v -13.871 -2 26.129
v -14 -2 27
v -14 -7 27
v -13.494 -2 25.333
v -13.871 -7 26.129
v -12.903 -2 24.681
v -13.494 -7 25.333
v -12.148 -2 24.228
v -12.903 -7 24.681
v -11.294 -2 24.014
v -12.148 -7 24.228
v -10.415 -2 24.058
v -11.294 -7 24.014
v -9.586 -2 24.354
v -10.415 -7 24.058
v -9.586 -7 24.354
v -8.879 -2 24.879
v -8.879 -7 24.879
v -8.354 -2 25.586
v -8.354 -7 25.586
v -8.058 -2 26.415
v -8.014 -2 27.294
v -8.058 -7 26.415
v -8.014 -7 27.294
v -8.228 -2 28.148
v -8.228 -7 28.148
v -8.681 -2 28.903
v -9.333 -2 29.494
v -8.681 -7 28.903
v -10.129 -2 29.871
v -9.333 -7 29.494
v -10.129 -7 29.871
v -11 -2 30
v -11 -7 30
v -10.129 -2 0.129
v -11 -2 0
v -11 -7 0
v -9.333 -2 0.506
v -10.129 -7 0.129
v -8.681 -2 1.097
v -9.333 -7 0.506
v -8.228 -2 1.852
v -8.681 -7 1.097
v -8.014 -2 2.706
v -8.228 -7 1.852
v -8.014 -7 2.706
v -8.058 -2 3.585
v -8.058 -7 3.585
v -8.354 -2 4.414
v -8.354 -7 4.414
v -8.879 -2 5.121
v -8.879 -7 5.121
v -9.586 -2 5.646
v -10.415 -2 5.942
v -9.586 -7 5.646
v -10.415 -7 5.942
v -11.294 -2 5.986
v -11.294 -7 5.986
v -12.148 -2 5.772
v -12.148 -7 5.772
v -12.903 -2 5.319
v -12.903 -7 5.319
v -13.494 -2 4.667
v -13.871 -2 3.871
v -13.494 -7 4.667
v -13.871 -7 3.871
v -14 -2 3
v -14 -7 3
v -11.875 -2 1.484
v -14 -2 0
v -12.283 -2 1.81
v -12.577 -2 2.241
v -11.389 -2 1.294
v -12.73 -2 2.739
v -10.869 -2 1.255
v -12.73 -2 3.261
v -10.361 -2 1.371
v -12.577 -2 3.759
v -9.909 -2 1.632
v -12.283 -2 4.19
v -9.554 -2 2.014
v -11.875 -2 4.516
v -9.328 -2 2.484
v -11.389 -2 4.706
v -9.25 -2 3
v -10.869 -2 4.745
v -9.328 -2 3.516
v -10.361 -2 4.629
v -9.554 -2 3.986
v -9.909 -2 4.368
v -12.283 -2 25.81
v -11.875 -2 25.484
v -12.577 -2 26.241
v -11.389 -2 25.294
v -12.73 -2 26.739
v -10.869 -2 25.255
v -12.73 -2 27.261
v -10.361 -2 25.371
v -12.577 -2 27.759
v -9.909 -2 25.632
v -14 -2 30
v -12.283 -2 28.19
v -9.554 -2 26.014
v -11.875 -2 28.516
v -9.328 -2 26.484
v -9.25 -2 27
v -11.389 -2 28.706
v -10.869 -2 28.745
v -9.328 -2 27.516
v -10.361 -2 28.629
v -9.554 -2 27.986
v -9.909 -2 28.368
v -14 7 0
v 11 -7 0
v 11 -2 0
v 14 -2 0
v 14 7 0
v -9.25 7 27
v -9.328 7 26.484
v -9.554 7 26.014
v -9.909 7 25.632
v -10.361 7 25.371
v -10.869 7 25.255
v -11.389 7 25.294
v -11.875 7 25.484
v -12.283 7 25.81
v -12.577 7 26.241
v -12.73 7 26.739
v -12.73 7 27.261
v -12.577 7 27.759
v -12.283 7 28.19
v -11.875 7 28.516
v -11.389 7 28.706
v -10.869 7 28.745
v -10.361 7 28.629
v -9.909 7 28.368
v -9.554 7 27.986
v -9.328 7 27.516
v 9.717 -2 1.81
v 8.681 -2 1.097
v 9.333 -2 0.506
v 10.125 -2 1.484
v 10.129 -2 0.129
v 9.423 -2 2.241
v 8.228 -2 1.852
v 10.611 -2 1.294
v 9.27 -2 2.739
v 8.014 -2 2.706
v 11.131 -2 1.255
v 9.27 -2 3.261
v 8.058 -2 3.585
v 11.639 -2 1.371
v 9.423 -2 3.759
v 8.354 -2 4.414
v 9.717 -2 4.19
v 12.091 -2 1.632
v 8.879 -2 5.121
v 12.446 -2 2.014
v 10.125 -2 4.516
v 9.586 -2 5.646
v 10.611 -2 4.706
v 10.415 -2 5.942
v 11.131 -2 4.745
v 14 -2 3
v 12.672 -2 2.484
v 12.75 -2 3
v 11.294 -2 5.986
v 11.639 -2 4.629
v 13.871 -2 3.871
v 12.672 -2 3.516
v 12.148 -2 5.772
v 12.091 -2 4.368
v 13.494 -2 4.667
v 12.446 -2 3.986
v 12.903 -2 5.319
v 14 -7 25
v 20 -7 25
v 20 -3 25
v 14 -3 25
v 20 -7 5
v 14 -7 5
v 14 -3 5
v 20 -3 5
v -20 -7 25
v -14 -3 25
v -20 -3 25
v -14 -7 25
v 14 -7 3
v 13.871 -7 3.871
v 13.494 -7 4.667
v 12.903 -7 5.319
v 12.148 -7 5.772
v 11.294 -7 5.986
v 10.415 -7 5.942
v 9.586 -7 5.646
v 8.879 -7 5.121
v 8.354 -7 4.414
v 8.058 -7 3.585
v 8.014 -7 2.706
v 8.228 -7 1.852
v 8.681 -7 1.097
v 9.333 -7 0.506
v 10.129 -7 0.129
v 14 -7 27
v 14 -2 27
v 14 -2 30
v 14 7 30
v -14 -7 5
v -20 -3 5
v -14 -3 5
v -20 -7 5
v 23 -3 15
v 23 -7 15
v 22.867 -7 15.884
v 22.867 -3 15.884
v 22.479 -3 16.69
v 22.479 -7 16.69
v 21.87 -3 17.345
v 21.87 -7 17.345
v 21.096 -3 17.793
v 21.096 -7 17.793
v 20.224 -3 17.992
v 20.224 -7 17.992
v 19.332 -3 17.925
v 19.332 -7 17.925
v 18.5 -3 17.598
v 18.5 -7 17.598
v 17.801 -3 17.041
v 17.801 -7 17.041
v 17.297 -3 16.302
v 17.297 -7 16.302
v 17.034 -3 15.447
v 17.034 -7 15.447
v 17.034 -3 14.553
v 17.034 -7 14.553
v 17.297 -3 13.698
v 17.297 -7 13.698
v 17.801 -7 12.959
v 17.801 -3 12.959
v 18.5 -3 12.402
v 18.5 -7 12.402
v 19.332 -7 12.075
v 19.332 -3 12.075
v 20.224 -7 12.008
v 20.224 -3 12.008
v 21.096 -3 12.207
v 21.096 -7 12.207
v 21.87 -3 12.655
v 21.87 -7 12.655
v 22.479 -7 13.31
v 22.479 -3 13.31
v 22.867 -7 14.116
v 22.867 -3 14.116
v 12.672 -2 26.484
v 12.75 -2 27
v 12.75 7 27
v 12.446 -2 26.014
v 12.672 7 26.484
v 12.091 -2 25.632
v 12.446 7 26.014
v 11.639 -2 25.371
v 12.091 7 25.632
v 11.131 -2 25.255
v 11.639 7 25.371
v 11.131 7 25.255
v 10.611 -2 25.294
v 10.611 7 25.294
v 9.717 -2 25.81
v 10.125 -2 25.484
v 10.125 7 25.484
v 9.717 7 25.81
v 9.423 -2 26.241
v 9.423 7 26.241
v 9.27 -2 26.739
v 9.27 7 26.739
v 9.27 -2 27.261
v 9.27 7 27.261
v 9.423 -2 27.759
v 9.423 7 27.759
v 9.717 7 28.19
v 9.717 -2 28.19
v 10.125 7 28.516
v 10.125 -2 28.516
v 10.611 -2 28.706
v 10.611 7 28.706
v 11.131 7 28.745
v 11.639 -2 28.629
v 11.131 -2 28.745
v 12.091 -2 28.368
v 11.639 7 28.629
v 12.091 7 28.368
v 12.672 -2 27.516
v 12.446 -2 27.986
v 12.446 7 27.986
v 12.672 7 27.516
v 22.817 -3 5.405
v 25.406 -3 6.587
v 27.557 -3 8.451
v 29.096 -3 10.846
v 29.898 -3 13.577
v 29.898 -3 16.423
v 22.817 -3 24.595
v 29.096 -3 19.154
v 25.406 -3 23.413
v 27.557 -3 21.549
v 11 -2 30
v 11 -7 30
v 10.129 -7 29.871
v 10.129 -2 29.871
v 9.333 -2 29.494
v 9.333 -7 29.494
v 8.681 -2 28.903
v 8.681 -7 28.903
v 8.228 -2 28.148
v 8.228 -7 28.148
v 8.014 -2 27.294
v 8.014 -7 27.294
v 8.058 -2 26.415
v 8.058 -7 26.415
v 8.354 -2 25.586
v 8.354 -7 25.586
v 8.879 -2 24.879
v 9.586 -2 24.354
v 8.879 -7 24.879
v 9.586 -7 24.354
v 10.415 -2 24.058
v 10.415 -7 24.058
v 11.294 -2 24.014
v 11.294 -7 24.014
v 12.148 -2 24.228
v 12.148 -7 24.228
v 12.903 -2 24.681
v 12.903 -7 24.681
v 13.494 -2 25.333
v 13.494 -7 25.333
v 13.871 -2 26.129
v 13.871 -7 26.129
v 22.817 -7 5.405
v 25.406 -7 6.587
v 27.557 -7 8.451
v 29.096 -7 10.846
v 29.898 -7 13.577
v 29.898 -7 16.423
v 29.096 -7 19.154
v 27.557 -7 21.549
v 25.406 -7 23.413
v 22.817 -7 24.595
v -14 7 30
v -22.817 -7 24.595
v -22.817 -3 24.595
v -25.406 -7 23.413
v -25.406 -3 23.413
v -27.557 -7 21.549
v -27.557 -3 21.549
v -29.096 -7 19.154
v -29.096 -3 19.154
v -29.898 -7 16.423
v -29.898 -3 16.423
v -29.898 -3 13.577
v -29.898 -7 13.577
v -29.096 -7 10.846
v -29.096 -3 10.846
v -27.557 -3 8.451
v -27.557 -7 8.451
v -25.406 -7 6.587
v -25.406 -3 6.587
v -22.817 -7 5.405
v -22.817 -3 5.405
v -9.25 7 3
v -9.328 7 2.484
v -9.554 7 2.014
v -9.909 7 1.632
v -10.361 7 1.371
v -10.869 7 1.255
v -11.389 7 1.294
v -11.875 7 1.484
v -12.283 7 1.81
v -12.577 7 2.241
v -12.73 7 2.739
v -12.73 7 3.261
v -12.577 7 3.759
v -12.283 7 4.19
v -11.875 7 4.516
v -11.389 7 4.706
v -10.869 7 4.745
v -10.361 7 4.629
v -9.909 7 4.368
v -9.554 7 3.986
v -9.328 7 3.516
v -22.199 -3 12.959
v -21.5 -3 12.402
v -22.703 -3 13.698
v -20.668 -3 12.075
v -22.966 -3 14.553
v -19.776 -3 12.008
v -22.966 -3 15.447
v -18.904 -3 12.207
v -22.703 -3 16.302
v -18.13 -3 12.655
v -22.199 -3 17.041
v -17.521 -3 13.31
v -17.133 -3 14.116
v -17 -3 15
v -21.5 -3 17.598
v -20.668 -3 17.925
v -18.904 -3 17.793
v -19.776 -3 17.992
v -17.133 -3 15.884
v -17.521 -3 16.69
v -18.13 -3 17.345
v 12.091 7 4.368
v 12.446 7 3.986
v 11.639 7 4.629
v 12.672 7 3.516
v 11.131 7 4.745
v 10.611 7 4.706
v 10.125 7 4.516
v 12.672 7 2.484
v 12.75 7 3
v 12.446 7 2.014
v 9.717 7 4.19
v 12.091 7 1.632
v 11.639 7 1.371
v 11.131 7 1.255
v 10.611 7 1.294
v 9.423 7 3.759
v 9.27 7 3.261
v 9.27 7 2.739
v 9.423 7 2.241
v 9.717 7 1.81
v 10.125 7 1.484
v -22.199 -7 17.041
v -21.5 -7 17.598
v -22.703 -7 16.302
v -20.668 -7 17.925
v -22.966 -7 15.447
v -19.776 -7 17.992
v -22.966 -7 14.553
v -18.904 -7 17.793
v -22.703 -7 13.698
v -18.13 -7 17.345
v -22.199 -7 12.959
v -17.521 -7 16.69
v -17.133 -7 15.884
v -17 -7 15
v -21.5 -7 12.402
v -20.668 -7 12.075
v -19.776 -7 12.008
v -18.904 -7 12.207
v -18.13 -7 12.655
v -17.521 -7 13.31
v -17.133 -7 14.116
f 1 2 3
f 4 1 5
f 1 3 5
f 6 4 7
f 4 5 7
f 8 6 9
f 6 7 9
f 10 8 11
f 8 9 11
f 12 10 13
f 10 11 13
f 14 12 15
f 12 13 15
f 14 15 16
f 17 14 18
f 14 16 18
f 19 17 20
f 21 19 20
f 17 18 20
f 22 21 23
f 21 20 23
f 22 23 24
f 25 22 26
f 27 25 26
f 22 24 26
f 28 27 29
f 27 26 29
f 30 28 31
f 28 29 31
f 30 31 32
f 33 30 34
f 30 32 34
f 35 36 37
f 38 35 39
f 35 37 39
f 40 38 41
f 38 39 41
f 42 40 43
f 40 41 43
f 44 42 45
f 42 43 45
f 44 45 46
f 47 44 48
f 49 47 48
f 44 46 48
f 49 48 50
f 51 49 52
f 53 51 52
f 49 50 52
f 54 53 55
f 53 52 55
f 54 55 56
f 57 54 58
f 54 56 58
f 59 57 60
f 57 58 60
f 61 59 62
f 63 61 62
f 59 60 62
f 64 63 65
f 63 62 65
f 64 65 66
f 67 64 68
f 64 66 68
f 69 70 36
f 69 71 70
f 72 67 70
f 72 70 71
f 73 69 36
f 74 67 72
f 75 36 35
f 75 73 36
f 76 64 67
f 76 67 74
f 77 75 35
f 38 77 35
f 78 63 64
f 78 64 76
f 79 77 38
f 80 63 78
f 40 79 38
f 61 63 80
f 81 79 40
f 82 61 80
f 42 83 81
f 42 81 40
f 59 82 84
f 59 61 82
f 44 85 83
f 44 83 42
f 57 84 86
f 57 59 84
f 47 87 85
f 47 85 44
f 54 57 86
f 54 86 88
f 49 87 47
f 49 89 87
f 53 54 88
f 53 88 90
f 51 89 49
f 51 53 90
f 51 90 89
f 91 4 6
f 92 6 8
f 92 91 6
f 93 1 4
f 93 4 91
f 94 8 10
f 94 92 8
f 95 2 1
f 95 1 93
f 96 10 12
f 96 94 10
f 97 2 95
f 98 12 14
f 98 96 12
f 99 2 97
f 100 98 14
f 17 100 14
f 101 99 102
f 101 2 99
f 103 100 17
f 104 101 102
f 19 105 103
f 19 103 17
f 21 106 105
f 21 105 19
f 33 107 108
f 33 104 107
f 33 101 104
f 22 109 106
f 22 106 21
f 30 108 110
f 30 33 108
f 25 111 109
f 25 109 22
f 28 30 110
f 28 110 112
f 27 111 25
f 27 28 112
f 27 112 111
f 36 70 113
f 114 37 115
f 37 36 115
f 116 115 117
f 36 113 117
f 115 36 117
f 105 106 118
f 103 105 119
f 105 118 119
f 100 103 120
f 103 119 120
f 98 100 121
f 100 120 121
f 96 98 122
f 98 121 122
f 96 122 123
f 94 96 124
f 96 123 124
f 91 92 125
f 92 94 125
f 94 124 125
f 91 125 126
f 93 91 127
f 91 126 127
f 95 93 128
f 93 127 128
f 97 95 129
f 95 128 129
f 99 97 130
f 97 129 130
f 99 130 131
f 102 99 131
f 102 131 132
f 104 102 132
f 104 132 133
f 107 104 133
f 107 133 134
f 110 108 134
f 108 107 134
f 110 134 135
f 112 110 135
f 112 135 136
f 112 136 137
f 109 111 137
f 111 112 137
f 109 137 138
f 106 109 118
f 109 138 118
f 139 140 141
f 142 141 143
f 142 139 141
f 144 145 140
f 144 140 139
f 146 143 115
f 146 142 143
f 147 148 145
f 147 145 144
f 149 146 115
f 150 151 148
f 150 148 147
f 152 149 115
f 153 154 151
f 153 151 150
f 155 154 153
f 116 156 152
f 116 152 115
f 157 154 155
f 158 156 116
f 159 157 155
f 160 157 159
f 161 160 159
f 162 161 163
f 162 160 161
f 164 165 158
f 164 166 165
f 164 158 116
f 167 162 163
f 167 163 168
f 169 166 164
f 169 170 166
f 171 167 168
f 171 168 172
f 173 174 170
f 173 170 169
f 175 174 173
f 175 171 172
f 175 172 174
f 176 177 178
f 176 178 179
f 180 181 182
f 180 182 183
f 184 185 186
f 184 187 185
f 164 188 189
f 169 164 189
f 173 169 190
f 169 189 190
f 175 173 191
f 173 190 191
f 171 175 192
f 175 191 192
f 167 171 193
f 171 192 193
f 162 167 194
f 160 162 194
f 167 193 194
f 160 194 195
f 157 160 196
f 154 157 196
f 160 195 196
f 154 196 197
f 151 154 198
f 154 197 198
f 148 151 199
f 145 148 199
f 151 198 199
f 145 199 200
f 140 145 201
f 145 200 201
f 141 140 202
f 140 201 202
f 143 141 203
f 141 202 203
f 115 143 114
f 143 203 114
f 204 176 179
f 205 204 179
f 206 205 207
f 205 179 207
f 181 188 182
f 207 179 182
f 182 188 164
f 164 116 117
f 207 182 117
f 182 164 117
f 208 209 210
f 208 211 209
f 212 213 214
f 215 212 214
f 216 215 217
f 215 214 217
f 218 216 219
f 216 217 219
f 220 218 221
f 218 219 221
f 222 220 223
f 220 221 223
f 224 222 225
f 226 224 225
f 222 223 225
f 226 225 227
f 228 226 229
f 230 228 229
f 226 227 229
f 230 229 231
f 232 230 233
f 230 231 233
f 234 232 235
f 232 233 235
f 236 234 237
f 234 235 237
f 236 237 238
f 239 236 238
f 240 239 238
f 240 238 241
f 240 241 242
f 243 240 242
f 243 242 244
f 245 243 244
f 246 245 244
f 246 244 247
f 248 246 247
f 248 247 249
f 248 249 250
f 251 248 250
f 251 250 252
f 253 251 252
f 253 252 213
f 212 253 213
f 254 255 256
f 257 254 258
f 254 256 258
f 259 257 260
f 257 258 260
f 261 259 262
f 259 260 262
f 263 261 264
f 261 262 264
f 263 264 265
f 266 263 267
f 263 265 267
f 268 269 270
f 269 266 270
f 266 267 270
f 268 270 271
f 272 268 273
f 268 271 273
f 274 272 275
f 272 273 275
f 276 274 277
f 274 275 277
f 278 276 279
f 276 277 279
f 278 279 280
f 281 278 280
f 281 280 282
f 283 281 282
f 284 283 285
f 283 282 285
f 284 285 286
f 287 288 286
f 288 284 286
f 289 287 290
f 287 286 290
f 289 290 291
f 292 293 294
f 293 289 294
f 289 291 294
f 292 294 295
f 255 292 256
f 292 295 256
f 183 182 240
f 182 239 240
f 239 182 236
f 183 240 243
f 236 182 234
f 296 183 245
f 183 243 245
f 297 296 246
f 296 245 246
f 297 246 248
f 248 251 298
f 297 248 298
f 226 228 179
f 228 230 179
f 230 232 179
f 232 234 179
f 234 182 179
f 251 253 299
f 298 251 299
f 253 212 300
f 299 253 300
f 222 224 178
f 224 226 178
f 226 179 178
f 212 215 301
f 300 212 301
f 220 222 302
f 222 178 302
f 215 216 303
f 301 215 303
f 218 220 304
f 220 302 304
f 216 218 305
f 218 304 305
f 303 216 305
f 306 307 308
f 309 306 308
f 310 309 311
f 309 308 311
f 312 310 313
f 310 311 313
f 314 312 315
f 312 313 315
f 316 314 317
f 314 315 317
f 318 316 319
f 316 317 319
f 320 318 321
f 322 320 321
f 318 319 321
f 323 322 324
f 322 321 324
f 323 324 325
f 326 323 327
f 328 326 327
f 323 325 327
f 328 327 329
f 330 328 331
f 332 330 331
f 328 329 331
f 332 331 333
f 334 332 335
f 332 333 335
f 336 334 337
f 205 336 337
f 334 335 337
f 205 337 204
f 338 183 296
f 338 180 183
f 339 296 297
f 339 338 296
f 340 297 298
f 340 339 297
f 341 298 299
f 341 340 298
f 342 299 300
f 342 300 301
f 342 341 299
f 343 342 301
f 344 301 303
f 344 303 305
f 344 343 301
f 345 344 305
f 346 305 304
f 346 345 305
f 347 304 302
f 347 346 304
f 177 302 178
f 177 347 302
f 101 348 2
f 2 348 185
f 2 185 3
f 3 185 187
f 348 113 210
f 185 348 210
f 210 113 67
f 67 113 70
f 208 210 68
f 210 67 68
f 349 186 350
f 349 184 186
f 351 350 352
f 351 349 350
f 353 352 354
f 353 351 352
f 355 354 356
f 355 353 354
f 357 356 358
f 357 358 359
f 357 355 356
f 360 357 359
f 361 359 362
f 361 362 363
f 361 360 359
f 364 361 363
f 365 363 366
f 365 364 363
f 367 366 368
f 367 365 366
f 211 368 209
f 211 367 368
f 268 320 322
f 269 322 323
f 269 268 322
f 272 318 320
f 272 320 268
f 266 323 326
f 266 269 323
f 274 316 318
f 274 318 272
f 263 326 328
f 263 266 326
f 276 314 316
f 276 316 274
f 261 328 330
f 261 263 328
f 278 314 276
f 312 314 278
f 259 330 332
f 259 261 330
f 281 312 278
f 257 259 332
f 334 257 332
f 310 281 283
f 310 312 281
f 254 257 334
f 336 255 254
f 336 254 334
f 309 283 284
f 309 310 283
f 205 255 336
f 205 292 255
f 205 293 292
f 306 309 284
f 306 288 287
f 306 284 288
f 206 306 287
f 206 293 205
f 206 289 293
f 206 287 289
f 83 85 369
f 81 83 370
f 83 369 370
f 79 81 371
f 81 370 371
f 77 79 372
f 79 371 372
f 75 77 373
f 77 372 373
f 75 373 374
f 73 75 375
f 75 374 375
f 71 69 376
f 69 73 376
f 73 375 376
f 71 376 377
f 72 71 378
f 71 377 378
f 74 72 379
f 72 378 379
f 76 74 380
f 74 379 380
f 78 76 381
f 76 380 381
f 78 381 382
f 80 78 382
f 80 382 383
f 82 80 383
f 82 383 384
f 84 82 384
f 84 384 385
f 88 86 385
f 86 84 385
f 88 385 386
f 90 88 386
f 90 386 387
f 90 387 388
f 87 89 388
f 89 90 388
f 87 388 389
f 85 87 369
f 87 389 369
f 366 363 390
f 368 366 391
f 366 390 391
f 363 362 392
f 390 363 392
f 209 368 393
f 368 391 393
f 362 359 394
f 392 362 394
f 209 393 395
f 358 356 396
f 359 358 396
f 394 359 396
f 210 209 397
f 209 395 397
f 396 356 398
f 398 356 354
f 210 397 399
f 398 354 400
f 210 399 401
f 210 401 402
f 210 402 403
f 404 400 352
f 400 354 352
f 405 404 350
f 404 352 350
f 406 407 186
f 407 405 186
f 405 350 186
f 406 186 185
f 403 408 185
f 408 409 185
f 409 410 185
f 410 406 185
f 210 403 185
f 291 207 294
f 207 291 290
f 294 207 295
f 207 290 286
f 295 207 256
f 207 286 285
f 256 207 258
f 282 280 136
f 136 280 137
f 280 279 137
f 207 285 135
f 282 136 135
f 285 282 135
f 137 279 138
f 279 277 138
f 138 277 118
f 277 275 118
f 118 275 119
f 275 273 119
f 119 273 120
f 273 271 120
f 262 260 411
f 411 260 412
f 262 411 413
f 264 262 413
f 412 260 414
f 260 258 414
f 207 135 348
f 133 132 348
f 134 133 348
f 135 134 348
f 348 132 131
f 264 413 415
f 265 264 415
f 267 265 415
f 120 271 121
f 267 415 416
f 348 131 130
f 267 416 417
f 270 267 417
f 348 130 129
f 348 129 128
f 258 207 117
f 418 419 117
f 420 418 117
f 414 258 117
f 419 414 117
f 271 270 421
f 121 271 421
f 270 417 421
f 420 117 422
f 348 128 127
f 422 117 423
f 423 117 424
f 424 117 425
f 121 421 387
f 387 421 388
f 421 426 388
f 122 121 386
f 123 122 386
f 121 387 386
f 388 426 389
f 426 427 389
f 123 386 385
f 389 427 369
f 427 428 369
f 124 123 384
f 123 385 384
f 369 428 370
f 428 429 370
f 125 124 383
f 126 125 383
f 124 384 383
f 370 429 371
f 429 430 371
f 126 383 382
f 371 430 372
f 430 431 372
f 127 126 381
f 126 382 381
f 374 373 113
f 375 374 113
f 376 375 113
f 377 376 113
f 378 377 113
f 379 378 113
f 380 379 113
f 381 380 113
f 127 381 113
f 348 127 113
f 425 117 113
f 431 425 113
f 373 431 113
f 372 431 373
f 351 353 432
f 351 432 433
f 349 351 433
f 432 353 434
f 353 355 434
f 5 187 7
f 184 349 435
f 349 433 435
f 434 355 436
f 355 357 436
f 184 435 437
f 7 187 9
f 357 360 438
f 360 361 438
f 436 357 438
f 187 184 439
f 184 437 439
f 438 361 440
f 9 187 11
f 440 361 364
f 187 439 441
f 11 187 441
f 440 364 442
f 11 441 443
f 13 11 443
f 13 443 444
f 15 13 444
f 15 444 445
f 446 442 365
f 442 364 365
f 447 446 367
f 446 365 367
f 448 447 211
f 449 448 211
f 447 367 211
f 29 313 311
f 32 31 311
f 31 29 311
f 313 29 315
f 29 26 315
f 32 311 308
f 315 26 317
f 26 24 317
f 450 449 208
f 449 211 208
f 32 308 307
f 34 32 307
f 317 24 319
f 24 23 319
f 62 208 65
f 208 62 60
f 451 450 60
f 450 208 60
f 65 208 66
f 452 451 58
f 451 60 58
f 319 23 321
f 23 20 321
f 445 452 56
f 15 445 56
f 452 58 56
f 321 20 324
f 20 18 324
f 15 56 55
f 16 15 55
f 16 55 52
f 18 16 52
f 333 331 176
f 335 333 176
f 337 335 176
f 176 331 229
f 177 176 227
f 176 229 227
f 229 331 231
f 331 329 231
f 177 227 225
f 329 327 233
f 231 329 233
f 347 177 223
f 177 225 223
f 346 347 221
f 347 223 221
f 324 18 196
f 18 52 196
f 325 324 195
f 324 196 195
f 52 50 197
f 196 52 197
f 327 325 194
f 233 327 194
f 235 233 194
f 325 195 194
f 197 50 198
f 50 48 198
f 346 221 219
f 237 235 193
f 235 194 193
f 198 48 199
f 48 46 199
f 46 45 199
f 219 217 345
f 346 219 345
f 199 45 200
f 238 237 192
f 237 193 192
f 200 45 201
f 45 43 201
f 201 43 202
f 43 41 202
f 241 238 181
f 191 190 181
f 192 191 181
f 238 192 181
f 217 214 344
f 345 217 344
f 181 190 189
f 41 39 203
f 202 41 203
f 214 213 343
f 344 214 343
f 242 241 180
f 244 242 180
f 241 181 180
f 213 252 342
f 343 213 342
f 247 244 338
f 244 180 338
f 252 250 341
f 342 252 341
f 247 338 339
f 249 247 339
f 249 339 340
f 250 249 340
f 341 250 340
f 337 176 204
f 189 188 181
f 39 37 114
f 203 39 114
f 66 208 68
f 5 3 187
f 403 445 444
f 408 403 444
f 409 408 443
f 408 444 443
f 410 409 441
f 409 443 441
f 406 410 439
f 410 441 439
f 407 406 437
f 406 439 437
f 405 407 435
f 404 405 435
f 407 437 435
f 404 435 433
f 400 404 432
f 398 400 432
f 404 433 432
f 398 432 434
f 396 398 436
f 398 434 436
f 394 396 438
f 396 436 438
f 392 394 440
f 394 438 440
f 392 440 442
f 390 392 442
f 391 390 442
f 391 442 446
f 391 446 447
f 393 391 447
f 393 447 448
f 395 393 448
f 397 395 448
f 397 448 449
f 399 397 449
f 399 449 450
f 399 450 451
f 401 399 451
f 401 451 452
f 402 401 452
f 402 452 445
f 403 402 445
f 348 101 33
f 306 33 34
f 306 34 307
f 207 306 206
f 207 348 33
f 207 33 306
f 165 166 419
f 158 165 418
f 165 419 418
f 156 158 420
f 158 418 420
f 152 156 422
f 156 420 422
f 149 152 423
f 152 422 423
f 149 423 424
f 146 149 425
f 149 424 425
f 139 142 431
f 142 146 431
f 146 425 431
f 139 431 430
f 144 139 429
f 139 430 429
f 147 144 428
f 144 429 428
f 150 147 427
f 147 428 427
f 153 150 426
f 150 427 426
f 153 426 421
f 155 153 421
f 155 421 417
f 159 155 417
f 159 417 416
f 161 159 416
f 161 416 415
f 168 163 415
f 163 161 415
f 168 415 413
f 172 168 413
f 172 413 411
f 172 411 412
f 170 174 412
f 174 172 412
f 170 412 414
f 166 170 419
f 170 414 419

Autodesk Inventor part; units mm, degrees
ref_plane "YZ Plane" through (0, 0, 0) normal (1, 0, 0) x (0, 1, 0)
ref_plane "XZ Plane" through (0, 0, 0) normal (0, 1, 0) x (-1, 0, 0)
ref_plane "XY Plane" through (0, 0, 0) normal (0, 0, 1) x (1, 0, 0)
sketch "Sketch1" plane through (0, 0, 0) normal (0, 0, 1) x (1, 0, 0)
  line L0 (-14, -7) -> (14, -7)
  line L1 (14, -7) -> (14, 7)
  line L2 (14, 7) -> (-14, 7)
  line L3 (-14, 7) -> (-14, -7)
  line L4 (-14, -7) -> (14, 7) construction
  line L5 (14, -7) -> (-14, 7) construction
  point P0 (0, 0)
  dimension "d0" = 14
  dimension "d1" = 28
extrude "Extrusion1" add sketch "Sketch1" along normal blind 30
sketch "Sketch2" plane through (-14, -7, 0) normal (0, -1, 0) x (1, 0, 0)
  line L0 (-6, 15) -> (34, 15) construction
  line L1 (28, 30) -> (0, 30) projected
  line L2 (-6, 5) -> (34, 5)
  line L3 (34, 25) -> (-6, 25)
  arc A0 (-6, 25) -> (-6, 5) centre (-6, 15) ccw
  arc A1 (34, 5) -> (34, 25) centre (34, 15) ccw
  line L4 (14, 15) -> (14, 0) construction
  circle A2 centre (-6, 15) radius 3
  circle A3 centre (34, 15) radius 3
  line L5 (28, 0) -> (0, 0) projected
  dimension "d4" = 40
  dimension "d5" = 10
  dimension "d8" = 6
  dimension "d17" = 15
extrude "Extrusion2" add sketch "Sketch2" against normal blind 4
sketch "Sketch3" plane through (-14, 7, 0) normal (0, 1, 0) x (1, 0, 0)
  line L0 (28, 0) -> (0, 0) construction
  line L1 (0, 0) -> (0, -30) construction
  line L2 (28, -30) -> (0, -30) construction
  line L3 (28, 0) -> (28, -30) construction
  line L4 (3, -27) -> (3, -3) construction
  line L5 (3, -3) -> (25, -3) construction
  line L6 (25, -3) -> (25, -27) construction
  line L7 (25, -27) -> (3, -27) construction
  circle A0 centre (25, -27) radius 1.75
  circle A1 centre (3, -27) radius 1.75
  circle A2 centre (3, -3) radius 1.75
  circle A3 centre (25, -3) radius 1.75
  point P0 (14, 0)
  dimension "d9" = 22
  dimension "d10" = 24
  dimension "d11" = 3.5
extrude "Extrusion3" cut sketch "Sketch3" against normal through all
sketch "Sketch4" plane through (-14, -7, 0) normal (0, -1, 0) x (1, 0, 0)
  circle A0 centre (25, 27) radius 1.75 projected
  circle A1 centre (25, 27) radius 3
  circle A2 centre (25, 3) radius 1.75 projected
  circle A3 centre (25, 3) radius 3
  circle A4 centre (3, 3) radius 1.75 projected
  circle A5 centre (3, 3) radius 3
  circle A6 centre (3, 27) radius 1.75 projected
  circle A7 centre (3, 27) radius 3
  circle A8 centre (25, 27) radius 1.75 projected
  circle A9 centre (25, 3) radius 1.75 projected
  circle A10 centre (3, 3) radius 1.75 projected
  circle A11 centre (3, 27) radius 1.75 projected
  circle A12 centre (-6, 15) radius 3 projected
  circle A13 centre (34, 15) radius 3 projected
  line L0 (0, 0) -> (0, 5) projected
  line L1 (0, 0) -> (28, 0) projected
  line L2 (28, 0) -> (28, 5) projected
  line L3 (28, 5) -> (34, 5) projected
  arc A14 (34, 5) -> (34, 25) centre (34, 15) ccw projected
  line L4 (0, 30) -> (28, 30) projected
  arc A15 (-6, 25) -> (-6, 5) centre (-6, 15) ccw projected
  line L5 (-6, 5) -> (0, 5) projected
  line L6 (28, 25) -> (28, 30) projected
  line L7 (0, 25) -> (0, 30) projected
  line L8 (0, 25) -> (-6, 25) projected
  line L9 (34, 25) -> (28, 25) projected
  point P0 (14, 0)
  point P1 (0, 3)
  point P2 (3, 0)
  point P3 (28, 3)
  point P4 (25, 0)
  point P5 (0, 27)
  point P6 (3, 30)
  point P7 (28, 27)
  point P8 (25, 30)
  dimension "d14" = 6
extrude "Extrusion4" cut sketch "Sketch4" against normal blind 5 contours A1 | A1 L4 L6 | A7 | A7 L7 L4 | A3 | L2 L1 A3 | L1 L0 A5 | A5
properties part number "StantonBracket"
